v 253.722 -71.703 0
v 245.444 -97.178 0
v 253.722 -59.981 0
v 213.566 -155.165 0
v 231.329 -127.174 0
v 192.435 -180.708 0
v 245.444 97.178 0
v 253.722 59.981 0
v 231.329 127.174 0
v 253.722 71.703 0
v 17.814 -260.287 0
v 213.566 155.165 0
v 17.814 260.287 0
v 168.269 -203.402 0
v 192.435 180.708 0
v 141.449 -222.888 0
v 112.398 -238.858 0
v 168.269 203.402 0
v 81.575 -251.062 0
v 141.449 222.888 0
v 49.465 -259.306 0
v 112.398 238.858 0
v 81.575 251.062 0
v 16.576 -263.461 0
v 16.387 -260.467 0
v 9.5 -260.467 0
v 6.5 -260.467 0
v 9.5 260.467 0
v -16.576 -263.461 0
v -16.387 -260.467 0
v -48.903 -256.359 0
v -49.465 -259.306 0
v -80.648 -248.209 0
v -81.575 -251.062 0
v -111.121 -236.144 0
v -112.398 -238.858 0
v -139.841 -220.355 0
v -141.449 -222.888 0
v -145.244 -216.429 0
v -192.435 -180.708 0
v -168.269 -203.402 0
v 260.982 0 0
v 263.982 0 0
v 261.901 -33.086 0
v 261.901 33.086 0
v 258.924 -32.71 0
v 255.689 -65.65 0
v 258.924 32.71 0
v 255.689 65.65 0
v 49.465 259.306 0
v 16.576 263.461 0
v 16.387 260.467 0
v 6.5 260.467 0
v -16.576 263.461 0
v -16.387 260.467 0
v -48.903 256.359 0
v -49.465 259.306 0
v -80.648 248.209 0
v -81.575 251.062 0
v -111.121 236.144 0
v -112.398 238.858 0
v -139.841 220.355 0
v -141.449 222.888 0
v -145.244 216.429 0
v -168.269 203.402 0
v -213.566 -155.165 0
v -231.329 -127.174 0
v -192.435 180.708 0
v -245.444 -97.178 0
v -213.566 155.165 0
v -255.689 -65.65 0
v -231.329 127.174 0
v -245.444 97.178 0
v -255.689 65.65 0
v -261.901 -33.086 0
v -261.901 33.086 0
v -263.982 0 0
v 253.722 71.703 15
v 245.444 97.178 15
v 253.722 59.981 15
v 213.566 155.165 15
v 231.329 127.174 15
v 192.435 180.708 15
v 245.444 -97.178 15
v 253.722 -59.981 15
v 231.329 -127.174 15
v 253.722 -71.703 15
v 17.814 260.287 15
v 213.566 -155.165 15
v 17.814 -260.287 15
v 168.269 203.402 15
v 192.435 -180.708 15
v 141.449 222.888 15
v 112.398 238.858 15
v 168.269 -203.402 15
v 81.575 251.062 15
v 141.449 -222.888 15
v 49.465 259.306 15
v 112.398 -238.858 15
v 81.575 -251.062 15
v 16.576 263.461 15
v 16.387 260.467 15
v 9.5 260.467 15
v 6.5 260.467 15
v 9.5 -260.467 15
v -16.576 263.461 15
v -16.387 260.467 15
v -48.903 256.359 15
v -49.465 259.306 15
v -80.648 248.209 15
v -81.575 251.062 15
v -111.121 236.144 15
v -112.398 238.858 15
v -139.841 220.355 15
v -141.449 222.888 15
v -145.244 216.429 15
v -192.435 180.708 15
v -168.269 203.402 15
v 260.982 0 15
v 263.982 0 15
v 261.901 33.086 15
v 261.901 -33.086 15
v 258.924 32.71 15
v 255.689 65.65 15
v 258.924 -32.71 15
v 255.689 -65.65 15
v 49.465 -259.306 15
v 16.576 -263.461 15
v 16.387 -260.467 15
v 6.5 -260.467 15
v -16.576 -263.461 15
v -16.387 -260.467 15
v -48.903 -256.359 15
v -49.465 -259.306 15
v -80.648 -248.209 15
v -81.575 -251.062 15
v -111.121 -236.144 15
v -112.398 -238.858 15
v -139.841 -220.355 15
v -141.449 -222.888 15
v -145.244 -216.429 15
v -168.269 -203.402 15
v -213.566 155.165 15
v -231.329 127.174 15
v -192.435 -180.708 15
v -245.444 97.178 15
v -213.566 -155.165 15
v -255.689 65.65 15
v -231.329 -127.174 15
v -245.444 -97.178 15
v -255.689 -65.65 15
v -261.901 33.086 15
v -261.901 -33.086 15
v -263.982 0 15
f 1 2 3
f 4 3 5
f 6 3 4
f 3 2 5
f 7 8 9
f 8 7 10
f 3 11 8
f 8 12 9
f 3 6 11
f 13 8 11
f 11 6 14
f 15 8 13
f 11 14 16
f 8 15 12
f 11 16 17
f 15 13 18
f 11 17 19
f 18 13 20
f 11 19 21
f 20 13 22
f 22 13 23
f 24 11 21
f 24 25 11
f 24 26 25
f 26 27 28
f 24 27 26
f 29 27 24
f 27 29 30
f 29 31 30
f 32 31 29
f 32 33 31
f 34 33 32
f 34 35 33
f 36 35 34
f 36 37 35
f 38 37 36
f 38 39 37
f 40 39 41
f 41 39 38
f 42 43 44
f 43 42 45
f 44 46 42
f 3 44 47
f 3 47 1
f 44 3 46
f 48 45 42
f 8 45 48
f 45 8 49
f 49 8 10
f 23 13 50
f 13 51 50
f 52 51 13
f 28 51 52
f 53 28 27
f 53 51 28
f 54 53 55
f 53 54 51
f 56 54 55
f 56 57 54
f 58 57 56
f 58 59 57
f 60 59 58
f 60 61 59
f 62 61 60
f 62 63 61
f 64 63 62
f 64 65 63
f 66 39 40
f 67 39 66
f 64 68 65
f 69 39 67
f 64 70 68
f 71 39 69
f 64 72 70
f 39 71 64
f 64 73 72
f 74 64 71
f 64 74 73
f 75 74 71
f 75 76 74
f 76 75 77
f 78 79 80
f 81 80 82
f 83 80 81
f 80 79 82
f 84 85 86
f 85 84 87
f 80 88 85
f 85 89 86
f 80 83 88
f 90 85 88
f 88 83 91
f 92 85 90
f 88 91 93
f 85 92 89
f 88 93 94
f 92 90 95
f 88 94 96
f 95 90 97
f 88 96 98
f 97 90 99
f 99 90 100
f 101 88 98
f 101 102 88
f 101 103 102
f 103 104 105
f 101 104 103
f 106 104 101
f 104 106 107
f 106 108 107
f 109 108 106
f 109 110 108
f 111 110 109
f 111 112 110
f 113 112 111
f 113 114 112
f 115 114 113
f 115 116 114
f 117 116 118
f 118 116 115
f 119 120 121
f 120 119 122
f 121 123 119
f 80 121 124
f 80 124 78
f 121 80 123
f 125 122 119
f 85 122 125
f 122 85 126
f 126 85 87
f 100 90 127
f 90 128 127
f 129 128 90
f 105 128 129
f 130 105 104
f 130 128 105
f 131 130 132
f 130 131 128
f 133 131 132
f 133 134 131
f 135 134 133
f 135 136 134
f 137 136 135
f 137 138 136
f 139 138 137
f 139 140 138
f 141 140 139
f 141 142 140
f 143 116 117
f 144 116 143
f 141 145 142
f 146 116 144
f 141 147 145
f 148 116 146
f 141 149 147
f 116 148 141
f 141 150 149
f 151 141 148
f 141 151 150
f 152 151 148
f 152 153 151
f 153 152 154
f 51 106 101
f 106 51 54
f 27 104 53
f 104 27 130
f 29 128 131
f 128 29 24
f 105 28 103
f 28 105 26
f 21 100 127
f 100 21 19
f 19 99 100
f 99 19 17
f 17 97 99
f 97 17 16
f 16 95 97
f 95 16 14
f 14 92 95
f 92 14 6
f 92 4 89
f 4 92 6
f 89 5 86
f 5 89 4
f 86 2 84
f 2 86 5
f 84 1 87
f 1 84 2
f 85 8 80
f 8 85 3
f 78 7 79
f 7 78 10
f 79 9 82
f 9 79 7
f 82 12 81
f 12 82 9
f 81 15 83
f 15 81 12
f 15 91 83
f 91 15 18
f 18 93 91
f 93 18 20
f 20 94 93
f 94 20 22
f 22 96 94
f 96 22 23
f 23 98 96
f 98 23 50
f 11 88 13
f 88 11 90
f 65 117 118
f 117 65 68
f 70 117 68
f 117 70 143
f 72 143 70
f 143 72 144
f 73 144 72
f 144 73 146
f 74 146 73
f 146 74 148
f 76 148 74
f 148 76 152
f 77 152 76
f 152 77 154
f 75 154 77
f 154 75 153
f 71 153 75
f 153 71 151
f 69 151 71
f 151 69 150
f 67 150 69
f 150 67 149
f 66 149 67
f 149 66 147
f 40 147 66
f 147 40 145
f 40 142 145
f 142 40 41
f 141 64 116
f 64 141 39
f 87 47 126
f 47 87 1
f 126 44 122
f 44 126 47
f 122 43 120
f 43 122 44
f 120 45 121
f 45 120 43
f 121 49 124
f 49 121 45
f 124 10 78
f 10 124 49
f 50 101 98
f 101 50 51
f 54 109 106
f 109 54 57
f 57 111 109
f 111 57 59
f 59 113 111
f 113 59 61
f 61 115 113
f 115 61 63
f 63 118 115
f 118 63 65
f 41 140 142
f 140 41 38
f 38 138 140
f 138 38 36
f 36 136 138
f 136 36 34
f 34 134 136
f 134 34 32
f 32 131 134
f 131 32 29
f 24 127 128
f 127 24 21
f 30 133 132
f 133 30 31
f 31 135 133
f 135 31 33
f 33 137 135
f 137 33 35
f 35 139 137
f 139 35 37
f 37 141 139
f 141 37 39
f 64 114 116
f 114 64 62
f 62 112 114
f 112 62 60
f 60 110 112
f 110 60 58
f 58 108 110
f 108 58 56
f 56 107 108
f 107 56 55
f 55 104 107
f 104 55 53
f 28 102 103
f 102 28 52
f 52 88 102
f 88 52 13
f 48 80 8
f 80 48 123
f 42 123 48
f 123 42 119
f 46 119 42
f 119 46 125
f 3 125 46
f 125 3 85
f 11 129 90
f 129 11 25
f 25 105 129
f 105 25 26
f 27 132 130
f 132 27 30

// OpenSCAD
//hole diameter for led
diameter_hole = 12;
//number of holes, corresponds to n in fermat spiral formula
number_led = 250;
//thickness of base plate
height = 0;
//golden angle used in equation, you can also use "360/pow(((1+sqrt(5))/2),2)". you get near effects if you change this number
golden_angle = 360/(pow(1+5*sin($t*360),2));
//scaling factor (can also be interpreted as space between the center of the first hole to the second)
c = 16;
//starting led, if 0, there will be an led at center. number must be >= 0
start_led = 0;
//space between edge of the last led hole and edge of plate
outer_gap = 5;
//facenumber for circles
$fn = 50;
//total radius 
trad = (c*sqrt(number_led+start_led) + diameter_hole/2 + outer_gap);
echo("total radius is ", str(trad));
//wall height, this hight is on top of the bast plate
wallh = 15;
//voronoi walls (true means put them in)
voronoiwalls = true;
// outer wall thickness, 0 = no wall. the outer edge of the wall is "trad" calculated by "(c*sqrt(number_led+start_led) + diameter_hole/2 + outer_gap)" inner edge is just that minus this variable
outwall_thick = 3;
//half the thickness of voronoi walls (not sure why the voronoi algorithm takes it like this)
voronoi_thick = 1.5;
//voronoi wall fillet
voronoi_fillet = 3;

//use Filepe's voronoi algorithm. thanks Felipe Sanchez!

// (c)2013  <juca@members.fsf.org>
// licensed under the terms of the GNU GPL version 3 (or later)

function normalize(v) = v / norm(v);

//
// The voronoi() function generates a 2D surface, which can be provided to
// a) linear_extrude() to produce a 3D object
// b) intersection() to restrict it to a a specified shape -- see voronoi_polygon.scad
//
// Parameters:
//   points (required) ... nuclei coordinates (array of [x, y] pairs)
//   L                 ... the radius of the "world" (the pattern is built within this circle)
//   thickness         ... the thickness of the lines between cells
//   fillet             ... the radius applied to corners (fillet in CAD terms)
//   nuclei (bool)     ... show nuclei sites
//
// These parameters need to be kept more or less in proportion to each other, and to the distance
// apart of points in the point_set. If one or the other parameter is increased or decreased too
// much, you'll get no output.
//
module voronoi(points, L = 200, thickness = 1, fillet = 6, nuclei = true) {
	for (p = points) {
		difference() {
			minkowski() {
				intersection_for(p1 = points){
					if (p != p1) {
						angle = 90 + atan2(p[1] - p1[1], p[0] - p1[0]);

						translate((p + p1) / 2 - normalize(p1 - p) * (thickness + fillet))
						rotate([0, 0, angle])
						translate([-L, -L])
						square([2 * L, L]);
					}
				}
				circle(r = fillet, $fn = 20);
			}
			if (nuclei)
				translate(p) circle(r = 1, $fn = 20);
		}
	}
}

pointsf = [for (i = [start_led:number_led + start_led-1]) [c*sqrt(i)*cos(i*golden_angle),c*sqrt(i)*sin(i*golden_angle)]];

//make holes in main disk in fermat spiral
if (height>0){
translate([0,0,-height]){
    difference(){
        cylinder( h = height, r = trad);
        for (i = [0:len(pointsf)-1]){
            translate([pointsf[i][0],pointsf[i][1],-.5]){
                cylinder(h = height +1, d = diameter_hole);
            }
        }
    }
}
}

color("GreenYellow"){
//make voronoi walls
if (voronoiwalls){
    linear_extrude(wallh){
        difference(){
            circle(r = trad);
            voronoi(pointsf,L = trad,thickness = voronoi_thick,fillet = voronoi_fillet,nuclei = false);
        }
    }
}

//make outer wall, if thickness is zero there is no wall.
if (outwall_thick > 0){
    linear_extrude(wallh){
        difference(){
            circle(r = trad);
            circle(r = trad-outwall_thick);
        }
    }
}
}
